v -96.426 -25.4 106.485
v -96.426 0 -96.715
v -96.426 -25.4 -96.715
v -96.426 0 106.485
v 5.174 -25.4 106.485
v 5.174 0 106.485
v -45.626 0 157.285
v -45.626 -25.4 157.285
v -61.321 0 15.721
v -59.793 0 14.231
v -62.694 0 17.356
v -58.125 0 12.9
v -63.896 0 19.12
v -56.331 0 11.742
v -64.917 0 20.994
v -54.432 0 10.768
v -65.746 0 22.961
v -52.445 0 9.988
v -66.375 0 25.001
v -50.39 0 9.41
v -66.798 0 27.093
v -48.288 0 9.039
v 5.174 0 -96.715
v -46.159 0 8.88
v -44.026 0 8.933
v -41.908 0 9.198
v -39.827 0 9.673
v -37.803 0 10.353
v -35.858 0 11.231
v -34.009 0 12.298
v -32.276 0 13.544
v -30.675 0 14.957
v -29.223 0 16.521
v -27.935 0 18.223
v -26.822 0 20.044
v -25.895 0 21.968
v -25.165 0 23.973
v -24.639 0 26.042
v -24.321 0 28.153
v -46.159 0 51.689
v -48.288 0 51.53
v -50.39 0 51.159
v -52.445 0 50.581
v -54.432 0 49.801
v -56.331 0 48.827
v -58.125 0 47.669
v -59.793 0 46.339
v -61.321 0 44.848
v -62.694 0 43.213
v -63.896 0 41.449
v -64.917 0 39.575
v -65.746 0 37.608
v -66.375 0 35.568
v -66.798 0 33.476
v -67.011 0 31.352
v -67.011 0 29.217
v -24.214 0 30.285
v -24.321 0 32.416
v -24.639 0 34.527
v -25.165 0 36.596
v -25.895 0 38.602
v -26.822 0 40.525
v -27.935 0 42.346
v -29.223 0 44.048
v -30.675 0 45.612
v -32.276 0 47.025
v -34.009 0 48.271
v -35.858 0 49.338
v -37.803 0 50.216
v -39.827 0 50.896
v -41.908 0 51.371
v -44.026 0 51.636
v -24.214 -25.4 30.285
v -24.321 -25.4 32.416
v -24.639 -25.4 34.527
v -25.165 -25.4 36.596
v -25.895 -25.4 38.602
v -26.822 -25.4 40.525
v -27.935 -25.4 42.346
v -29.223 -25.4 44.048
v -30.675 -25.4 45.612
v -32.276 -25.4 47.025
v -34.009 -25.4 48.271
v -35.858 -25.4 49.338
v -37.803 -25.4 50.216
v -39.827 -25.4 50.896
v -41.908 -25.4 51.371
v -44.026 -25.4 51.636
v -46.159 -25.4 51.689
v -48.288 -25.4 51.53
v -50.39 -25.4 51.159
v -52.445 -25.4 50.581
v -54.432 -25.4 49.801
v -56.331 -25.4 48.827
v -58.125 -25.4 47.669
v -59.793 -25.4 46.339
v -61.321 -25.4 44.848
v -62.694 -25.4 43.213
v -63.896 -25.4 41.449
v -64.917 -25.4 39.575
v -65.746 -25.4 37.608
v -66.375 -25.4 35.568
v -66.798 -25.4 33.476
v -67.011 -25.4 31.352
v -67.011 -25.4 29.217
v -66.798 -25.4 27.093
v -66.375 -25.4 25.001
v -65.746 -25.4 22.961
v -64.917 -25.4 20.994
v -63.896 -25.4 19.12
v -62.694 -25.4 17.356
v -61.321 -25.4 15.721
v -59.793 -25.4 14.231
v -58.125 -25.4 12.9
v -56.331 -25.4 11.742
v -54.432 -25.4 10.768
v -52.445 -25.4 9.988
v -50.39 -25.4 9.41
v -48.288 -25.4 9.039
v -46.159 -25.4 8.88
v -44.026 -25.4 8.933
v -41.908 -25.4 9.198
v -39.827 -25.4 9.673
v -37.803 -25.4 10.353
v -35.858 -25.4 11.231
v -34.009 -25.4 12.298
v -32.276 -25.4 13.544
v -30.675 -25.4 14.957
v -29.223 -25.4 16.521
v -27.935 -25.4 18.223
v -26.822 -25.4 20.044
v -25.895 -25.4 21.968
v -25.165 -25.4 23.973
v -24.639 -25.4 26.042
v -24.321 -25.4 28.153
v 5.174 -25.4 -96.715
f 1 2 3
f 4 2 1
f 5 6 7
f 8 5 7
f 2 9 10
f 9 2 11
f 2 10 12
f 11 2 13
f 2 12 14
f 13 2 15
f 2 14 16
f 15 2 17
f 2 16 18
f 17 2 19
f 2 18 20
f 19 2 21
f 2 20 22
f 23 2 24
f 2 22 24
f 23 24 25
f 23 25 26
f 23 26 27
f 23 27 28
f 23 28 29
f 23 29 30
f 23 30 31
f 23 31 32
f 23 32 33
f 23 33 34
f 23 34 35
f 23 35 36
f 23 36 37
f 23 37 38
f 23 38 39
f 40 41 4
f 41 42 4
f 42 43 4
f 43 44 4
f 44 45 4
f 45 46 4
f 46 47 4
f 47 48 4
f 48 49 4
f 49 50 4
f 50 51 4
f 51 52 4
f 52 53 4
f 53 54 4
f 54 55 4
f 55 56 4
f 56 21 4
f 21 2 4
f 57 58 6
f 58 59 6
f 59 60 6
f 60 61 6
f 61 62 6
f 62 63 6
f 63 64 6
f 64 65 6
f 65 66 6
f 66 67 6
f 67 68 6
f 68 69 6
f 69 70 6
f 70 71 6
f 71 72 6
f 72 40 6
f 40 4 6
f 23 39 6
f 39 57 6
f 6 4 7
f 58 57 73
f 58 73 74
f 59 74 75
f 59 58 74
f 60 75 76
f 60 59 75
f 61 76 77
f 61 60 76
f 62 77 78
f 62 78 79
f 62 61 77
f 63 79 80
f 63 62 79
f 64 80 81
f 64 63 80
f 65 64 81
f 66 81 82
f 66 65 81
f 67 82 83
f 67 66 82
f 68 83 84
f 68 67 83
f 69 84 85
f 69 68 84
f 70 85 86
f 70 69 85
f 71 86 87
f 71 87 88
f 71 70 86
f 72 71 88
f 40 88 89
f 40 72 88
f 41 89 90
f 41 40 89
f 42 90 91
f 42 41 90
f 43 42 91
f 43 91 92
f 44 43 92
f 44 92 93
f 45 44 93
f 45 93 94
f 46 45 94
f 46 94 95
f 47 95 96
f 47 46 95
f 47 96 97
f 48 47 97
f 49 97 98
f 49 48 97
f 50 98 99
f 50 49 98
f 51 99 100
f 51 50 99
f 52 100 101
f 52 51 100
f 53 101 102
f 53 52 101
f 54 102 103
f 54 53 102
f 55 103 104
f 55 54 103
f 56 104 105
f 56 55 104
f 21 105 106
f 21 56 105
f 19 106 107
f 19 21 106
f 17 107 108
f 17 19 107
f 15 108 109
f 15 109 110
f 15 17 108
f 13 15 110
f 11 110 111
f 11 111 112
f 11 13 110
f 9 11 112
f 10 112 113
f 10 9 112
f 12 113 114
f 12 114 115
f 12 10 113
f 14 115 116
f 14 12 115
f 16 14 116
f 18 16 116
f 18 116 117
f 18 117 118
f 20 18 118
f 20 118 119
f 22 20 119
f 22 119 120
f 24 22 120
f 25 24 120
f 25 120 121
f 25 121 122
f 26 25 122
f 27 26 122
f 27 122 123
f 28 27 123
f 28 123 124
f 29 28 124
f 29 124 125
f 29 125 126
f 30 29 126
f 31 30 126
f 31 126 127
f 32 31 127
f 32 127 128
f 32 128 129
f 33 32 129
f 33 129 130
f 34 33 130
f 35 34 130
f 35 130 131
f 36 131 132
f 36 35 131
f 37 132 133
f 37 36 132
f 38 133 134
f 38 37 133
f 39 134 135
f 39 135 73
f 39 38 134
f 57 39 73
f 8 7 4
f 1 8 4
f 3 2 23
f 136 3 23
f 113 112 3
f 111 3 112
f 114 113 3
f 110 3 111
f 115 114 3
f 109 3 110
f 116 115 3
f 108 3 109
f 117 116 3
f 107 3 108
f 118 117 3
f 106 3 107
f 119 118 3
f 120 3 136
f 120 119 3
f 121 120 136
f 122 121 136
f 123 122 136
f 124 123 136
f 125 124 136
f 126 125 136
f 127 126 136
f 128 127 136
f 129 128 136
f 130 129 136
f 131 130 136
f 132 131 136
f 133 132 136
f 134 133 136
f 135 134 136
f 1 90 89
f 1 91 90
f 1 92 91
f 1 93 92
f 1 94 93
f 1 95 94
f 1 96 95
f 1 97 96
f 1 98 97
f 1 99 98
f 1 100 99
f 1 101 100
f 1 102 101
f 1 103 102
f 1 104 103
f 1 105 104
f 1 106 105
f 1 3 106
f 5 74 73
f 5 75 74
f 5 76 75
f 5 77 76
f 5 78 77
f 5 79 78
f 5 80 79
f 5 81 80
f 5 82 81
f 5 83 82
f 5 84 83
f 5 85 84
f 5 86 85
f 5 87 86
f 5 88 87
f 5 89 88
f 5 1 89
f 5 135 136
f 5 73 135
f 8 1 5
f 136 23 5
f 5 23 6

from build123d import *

# Parameters (mm, degrees)
F0_W     = 101.6
F0_H     = 203.2
F0_R     = 21.411557
F1_DEPTH = 25.4


with BuildPart() as f1:
    # F0 (on Front) → F1 (new body)
    with BuildSketch(Plane.XZ):
        with Locations((-45.625693, 4.884522)):
            Rectangle(F0_W, F0_H)
        with Locations((-45.625693, 30.284522)):
            Circle(F0_R, mode=Mode.SUBTRACT)
        Polygon((-45.625693, 157.284522), (-96.425693, 106.484522), (5.174307, 106.484522), align=None)
    extrude(amount=F1_DEPTH)


solid = f1.part
